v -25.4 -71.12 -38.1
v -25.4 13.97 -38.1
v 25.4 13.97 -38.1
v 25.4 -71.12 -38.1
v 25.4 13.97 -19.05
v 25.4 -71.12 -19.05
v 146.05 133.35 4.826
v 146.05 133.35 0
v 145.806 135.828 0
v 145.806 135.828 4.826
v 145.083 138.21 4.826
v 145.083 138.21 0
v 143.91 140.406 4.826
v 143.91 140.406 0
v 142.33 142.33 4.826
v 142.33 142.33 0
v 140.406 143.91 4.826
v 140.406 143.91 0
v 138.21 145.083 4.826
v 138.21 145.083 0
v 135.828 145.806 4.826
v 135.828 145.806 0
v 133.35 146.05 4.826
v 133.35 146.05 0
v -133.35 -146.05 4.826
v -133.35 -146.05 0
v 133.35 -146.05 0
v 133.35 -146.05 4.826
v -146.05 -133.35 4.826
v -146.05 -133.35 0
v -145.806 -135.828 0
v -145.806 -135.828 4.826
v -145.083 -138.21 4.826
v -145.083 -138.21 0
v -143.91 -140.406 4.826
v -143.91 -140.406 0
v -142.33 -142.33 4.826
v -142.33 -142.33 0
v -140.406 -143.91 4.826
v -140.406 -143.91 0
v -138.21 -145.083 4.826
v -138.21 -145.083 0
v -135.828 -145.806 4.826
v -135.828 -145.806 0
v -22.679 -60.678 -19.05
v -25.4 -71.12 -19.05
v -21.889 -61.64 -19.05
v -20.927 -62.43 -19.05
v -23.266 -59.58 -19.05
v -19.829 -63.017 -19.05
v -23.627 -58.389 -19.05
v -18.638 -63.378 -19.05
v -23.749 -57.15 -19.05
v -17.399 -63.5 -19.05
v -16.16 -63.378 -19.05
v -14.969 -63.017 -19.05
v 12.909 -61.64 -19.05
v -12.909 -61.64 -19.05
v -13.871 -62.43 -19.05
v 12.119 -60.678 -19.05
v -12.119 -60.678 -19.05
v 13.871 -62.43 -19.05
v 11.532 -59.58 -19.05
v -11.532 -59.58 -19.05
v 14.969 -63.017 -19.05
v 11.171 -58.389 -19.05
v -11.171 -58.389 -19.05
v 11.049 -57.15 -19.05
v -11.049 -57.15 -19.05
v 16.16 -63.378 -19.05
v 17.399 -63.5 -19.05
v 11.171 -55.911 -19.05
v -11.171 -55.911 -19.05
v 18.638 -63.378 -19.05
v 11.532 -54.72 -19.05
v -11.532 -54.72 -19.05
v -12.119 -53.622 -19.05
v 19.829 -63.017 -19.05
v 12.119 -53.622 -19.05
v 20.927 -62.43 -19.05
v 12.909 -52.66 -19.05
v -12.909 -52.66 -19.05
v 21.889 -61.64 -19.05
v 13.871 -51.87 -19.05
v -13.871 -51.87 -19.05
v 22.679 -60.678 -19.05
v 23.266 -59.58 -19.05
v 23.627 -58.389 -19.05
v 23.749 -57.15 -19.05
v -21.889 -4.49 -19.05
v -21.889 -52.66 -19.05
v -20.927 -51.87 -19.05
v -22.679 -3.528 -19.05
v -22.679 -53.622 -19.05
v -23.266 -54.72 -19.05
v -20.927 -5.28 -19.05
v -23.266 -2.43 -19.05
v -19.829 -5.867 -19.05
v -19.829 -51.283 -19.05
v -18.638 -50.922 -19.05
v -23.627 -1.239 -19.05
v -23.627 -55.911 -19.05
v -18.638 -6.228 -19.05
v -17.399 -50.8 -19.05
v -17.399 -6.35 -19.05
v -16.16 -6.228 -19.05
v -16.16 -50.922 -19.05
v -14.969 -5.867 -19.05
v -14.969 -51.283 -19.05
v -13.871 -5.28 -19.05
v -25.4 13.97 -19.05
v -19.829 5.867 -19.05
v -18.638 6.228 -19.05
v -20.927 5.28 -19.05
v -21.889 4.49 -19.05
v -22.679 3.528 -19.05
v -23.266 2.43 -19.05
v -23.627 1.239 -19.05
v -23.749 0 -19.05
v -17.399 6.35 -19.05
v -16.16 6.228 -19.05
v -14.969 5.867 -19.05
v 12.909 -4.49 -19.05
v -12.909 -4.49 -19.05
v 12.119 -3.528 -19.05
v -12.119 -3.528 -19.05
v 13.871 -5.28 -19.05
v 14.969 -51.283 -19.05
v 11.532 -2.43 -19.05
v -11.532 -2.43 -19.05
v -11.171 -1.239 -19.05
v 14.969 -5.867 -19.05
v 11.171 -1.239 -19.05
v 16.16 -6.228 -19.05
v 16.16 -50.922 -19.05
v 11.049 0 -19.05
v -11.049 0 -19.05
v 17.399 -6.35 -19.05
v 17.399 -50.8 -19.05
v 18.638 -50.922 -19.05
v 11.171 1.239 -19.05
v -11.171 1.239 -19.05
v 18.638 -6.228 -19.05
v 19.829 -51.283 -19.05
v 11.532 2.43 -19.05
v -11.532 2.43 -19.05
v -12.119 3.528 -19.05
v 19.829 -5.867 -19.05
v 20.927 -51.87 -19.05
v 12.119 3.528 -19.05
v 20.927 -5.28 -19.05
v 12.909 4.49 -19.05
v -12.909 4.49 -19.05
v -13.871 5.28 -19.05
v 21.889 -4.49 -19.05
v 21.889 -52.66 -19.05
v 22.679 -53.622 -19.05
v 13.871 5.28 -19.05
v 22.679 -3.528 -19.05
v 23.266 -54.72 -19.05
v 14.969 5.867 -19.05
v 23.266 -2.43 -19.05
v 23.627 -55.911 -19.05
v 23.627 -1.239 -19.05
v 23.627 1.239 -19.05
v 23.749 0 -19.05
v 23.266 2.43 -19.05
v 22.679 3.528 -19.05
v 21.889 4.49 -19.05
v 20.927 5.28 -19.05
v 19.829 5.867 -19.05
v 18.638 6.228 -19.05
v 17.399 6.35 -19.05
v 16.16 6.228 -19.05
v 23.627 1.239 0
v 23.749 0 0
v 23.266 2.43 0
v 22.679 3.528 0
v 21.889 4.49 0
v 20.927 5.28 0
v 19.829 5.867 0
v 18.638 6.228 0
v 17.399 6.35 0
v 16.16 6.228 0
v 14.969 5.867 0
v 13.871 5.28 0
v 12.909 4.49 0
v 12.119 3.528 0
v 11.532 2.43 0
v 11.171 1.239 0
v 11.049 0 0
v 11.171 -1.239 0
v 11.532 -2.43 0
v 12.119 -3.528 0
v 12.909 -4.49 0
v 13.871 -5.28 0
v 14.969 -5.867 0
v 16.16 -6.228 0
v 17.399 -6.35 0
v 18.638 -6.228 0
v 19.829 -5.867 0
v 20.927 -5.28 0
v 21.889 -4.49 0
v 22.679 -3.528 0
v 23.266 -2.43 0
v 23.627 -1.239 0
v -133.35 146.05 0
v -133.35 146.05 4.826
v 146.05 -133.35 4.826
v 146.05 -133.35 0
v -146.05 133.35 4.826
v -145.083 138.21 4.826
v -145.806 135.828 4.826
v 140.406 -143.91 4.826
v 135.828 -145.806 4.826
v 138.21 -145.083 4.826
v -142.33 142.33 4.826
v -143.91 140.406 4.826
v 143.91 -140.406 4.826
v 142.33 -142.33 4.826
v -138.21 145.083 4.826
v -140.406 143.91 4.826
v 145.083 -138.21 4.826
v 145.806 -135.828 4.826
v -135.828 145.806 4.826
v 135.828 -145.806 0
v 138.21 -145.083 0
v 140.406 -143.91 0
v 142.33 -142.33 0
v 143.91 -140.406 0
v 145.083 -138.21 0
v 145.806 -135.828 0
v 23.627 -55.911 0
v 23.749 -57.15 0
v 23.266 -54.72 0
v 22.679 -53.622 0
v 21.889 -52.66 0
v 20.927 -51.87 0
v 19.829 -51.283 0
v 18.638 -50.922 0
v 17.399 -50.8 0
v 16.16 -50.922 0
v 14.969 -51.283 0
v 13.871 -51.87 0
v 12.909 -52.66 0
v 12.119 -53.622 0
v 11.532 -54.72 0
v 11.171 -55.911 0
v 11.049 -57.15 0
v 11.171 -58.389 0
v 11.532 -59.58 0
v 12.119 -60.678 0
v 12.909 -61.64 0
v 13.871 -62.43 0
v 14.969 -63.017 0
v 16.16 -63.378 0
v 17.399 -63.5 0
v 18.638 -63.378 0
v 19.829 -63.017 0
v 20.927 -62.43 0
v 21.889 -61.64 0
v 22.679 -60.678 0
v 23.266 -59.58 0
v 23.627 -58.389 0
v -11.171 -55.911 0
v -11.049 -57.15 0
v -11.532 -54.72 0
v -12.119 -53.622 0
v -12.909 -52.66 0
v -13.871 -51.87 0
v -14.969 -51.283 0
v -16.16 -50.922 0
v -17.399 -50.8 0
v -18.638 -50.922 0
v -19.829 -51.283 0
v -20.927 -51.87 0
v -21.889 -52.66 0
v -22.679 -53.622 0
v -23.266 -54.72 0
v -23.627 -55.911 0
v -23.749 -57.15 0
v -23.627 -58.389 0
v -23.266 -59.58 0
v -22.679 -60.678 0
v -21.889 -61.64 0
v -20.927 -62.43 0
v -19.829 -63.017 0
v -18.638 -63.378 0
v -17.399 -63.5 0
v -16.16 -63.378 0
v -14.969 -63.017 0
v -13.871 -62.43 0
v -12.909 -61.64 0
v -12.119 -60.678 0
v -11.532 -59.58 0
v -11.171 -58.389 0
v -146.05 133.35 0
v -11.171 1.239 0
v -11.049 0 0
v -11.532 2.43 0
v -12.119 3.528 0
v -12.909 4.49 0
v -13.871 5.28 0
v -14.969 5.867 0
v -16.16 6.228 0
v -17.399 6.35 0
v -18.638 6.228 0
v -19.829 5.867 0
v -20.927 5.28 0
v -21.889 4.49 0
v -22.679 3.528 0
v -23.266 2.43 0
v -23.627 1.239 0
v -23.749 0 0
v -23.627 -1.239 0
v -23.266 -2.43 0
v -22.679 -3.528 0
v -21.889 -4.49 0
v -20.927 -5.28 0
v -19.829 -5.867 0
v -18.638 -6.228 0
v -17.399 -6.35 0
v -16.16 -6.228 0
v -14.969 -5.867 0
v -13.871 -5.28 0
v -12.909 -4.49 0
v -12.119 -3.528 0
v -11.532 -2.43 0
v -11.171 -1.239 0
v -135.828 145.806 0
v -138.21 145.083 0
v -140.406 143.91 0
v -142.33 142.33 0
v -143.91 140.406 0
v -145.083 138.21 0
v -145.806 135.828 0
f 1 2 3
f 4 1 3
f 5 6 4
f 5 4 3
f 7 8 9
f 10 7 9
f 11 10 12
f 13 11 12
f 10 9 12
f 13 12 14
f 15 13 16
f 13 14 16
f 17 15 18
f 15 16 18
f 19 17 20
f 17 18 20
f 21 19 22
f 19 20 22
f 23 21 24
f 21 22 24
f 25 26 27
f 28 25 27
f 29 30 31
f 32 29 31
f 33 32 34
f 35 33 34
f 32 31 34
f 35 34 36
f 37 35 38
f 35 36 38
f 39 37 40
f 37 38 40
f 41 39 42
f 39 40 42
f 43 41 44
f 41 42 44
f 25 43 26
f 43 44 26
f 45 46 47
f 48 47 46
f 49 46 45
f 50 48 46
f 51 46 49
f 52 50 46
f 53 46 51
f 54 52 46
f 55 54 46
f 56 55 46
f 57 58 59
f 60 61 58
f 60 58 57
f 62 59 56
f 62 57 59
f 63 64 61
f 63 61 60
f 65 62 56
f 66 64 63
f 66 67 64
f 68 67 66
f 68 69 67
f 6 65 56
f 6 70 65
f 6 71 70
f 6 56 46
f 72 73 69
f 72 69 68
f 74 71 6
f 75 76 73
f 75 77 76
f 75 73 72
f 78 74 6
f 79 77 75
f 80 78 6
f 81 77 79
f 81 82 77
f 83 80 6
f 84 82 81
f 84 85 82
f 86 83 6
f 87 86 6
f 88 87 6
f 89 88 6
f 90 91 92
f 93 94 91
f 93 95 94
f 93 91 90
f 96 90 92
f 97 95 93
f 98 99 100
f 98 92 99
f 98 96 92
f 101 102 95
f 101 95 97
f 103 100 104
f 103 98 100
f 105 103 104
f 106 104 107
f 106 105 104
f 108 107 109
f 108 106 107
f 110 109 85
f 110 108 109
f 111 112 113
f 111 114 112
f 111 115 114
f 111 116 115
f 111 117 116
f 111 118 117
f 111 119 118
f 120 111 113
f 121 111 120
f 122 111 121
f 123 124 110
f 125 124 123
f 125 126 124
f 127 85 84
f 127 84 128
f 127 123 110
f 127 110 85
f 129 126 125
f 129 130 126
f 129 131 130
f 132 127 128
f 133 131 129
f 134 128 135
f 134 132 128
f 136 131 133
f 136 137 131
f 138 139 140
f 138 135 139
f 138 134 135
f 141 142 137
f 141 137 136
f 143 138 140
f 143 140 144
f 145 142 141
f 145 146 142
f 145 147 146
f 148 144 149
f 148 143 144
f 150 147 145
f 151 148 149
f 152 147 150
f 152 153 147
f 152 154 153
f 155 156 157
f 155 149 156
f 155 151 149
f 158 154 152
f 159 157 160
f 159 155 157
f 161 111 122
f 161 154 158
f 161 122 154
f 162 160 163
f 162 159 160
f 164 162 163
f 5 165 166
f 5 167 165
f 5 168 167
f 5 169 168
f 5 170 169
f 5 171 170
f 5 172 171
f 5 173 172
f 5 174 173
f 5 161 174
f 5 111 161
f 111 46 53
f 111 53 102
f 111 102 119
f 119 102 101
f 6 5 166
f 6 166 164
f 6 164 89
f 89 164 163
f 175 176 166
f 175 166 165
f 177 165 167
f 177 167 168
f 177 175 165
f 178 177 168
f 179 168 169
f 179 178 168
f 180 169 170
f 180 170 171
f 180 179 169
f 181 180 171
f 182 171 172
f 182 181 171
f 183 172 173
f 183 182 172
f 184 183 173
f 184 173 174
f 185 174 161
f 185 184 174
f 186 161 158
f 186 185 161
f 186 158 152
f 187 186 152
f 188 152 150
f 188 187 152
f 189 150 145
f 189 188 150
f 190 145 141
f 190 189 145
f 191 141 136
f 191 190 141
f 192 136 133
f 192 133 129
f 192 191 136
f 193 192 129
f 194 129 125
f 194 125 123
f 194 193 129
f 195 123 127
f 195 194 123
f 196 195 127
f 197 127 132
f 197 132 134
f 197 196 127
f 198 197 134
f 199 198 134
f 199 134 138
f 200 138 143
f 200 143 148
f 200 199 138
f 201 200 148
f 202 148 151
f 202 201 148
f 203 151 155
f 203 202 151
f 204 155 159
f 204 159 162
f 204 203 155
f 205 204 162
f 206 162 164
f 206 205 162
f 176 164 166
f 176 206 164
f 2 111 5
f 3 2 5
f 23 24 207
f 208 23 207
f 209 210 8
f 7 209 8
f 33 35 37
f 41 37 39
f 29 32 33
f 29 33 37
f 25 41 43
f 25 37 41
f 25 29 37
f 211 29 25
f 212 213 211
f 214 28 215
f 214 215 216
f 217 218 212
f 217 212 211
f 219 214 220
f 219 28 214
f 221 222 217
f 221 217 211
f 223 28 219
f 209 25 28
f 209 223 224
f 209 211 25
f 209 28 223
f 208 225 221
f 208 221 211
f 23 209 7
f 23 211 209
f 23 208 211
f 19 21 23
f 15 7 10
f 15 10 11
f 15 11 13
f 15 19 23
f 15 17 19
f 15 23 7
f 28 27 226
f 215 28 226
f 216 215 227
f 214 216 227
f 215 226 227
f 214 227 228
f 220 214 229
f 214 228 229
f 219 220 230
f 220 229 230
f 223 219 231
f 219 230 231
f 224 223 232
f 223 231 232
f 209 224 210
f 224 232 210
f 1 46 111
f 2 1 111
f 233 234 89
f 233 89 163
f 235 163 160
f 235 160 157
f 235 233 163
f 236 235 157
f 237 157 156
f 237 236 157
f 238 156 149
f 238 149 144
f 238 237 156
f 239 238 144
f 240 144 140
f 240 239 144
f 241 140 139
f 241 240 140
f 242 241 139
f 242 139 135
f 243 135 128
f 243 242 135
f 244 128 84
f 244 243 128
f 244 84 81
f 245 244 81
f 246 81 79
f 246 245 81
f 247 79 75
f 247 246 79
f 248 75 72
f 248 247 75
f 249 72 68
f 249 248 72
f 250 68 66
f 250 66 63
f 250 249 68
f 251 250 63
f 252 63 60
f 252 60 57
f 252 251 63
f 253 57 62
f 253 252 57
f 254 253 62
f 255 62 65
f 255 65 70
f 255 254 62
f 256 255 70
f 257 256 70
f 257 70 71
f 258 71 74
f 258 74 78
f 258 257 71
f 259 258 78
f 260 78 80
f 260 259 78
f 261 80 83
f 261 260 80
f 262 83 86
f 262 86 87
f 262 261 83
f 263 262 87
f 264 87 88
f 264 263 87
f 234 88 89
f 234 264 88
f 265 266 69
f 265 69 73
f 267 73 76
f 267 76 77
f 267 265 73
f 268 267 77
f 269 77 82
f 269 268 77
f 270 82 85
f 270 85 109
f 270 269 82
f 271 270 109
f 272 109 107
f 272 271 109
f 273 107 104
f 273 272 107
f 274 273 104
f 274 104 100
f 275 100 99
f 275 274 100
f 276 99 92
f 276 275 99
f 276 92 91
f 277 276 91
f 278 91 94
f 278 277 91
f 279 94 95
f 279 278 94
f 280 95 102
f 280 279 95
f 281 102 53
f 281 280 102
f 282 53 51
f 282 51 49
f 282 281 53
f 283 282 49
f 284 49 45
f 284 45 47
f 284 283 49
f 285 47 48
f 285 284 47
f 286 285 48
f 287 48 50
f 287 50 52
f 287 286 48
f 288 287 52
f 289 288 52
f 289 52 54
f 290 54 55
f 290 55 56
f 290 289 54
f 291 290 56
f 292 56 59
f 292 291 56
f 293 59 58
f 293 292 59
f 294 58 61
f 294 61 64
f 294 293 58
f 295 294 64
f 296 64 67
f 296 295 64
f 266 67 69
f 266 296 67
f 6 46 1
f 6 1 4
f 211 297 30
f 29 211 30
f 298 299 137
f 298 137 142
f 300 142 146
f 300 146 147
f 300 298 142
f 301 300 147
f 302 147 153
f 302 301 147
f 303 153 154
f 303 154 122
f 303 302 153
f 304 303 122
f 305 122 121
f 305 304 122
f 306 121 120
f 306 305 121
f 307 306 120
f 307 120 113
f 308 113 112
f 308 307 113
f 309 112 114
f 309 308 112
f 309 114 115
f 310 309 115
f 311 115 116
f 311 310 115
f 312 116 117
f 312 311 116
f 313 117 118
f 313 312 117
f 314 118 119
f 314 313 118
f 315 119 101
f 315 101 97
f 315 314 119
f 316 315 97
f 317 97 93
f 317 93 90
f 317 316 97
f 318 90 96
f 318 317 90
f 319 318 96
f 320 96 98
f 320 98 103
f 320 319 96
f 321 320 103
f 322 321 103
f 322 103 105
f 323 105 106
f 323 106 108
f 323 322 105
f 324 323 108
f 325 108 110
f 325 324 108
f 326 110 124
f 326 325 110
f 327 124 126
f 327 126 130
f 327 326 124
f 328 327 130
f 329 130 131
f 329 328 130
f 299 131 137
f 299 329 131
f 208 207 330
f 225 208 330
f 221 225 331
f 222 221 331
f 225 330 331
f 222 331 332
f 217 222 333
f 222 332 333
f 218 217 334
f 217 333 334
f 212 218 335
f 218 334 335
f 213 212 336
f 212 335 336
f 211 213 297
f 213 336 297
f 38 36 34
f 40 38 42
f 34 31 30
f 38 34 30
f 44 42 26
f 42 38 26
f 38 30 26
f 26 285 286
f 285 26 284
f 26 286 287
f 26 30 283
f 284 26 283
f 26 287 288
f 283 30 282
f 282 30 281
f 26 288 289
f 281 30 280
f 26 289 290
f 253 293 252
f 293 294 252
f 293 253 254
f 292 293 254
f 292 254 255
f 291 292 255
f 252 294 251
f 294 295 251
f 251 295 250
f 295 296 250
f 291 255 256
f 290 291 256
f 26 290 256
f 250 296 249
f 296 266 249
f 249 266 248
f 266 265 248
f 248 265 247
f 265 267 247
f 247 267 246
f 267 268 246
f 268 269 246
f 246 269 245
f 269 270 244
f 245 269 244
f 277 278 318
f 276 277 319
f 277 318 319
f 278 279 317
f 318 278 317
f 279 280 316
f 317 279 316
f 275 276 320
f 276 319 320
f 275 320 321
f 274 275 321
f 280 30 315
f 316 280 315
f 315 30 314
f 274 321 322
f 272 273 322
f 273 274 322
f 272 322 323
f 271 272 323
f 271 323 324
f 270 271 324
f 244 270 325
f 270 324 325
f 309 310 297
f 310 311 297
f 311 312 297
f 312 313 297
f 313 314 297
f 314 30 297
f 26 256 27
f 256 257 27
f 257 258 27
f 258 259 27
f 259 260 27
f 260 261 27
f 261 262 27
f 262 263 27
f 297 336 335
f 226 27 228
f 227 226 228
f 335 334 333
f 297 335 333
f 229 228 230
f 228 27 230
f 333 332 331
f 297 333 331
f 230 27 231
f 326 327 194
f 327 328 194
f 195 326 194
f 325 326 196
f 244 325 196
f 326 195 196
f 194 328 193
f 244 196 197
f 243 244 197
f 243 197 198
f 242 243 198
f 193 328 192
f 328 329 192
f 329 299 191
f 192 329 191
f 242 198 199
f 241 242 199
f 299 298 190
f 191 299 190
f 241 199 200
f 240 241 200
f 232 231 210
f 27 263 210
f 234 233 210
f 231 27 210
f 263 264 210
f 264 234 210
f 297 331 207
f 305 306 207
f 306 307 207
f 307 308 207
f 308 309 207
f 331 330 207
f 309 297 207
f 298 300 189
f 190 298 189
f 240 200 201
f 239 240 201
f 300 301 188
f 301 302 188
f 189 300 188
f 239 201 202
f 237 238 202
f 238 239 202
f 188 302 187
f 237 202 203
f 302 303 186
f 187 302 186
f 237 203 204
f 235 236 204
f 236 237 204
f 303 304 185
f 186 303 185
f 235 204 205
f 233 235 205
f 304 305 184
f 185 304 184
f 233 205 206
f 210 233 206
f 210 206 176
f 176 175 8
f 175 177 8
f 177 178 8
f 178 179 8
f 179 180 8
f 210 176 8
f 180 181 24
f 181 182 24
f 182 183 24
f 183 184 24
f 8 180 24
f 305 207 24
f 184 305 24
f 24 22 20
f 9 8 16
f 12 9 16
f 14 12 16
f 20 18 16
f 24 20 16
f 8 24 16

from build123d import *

# Parameters (mm, degrees)
F1_DEPTH = 4.826
F2_R     = 6.35
F3_DEPTH = 19.05
F5_W     = 50.8
F5_H     = 85.09
F6_DEPTH = 19.05


with BuildPart() as f1:
    # F0 (on Top) → F1 (new body)
    with BuildSketch(Plane.XY):
        with BuildLine():
            ThreePointArc((146.05, 133.35), (142.330256, 142.330256), (133.35, 146.05))
            Line((133.35, 146.05), (-133.35, 146.05))
            ThreePointArc((-133.35, 146.05), (-142.330256, 142.330256), (-146.05, 133.35))
            Line((-146.05, 133.35), (-146.05, -133.35))
            ThreePointArc((-146.05, -133.35), (-142.330256, -142.330256), (-133.35, -146.05))
            Line((-133.35, -146.05), (133.35, -146.05))
            ThreePointArc((133.35, -146.05), (142.330256, -142.330256), (146.05, -133.35))
            Line((146.05, -133.35), (146.05, 133.35))
        make_face()
    extrude(amount=F1_DEPTH)

    # F2 (on Top) → F3 (join)
    with BuildSketch(Plane.XY):
        with Locations((-17.399, -57.15)):
            Circle(F2_R)
        with Locations((17.399, -57.15)):
            Circle(F2_R)
        with Locations((17.399, 0)):
            Circle(F2_R)
        with Locations((-17.399, 0)):
            Circle(F2_R)
    extrude(amount=-F3_DEPTH)

    # F5 (on offset) → F6 (join)
    with BuildSketch(Plane.XY.offset(-19.05)):
        with Locations((0, -28.575)):
            Rectangle(F5_W, F5_H)
    extrude(amount=-F6_DEPTH)


solid = f1.part
